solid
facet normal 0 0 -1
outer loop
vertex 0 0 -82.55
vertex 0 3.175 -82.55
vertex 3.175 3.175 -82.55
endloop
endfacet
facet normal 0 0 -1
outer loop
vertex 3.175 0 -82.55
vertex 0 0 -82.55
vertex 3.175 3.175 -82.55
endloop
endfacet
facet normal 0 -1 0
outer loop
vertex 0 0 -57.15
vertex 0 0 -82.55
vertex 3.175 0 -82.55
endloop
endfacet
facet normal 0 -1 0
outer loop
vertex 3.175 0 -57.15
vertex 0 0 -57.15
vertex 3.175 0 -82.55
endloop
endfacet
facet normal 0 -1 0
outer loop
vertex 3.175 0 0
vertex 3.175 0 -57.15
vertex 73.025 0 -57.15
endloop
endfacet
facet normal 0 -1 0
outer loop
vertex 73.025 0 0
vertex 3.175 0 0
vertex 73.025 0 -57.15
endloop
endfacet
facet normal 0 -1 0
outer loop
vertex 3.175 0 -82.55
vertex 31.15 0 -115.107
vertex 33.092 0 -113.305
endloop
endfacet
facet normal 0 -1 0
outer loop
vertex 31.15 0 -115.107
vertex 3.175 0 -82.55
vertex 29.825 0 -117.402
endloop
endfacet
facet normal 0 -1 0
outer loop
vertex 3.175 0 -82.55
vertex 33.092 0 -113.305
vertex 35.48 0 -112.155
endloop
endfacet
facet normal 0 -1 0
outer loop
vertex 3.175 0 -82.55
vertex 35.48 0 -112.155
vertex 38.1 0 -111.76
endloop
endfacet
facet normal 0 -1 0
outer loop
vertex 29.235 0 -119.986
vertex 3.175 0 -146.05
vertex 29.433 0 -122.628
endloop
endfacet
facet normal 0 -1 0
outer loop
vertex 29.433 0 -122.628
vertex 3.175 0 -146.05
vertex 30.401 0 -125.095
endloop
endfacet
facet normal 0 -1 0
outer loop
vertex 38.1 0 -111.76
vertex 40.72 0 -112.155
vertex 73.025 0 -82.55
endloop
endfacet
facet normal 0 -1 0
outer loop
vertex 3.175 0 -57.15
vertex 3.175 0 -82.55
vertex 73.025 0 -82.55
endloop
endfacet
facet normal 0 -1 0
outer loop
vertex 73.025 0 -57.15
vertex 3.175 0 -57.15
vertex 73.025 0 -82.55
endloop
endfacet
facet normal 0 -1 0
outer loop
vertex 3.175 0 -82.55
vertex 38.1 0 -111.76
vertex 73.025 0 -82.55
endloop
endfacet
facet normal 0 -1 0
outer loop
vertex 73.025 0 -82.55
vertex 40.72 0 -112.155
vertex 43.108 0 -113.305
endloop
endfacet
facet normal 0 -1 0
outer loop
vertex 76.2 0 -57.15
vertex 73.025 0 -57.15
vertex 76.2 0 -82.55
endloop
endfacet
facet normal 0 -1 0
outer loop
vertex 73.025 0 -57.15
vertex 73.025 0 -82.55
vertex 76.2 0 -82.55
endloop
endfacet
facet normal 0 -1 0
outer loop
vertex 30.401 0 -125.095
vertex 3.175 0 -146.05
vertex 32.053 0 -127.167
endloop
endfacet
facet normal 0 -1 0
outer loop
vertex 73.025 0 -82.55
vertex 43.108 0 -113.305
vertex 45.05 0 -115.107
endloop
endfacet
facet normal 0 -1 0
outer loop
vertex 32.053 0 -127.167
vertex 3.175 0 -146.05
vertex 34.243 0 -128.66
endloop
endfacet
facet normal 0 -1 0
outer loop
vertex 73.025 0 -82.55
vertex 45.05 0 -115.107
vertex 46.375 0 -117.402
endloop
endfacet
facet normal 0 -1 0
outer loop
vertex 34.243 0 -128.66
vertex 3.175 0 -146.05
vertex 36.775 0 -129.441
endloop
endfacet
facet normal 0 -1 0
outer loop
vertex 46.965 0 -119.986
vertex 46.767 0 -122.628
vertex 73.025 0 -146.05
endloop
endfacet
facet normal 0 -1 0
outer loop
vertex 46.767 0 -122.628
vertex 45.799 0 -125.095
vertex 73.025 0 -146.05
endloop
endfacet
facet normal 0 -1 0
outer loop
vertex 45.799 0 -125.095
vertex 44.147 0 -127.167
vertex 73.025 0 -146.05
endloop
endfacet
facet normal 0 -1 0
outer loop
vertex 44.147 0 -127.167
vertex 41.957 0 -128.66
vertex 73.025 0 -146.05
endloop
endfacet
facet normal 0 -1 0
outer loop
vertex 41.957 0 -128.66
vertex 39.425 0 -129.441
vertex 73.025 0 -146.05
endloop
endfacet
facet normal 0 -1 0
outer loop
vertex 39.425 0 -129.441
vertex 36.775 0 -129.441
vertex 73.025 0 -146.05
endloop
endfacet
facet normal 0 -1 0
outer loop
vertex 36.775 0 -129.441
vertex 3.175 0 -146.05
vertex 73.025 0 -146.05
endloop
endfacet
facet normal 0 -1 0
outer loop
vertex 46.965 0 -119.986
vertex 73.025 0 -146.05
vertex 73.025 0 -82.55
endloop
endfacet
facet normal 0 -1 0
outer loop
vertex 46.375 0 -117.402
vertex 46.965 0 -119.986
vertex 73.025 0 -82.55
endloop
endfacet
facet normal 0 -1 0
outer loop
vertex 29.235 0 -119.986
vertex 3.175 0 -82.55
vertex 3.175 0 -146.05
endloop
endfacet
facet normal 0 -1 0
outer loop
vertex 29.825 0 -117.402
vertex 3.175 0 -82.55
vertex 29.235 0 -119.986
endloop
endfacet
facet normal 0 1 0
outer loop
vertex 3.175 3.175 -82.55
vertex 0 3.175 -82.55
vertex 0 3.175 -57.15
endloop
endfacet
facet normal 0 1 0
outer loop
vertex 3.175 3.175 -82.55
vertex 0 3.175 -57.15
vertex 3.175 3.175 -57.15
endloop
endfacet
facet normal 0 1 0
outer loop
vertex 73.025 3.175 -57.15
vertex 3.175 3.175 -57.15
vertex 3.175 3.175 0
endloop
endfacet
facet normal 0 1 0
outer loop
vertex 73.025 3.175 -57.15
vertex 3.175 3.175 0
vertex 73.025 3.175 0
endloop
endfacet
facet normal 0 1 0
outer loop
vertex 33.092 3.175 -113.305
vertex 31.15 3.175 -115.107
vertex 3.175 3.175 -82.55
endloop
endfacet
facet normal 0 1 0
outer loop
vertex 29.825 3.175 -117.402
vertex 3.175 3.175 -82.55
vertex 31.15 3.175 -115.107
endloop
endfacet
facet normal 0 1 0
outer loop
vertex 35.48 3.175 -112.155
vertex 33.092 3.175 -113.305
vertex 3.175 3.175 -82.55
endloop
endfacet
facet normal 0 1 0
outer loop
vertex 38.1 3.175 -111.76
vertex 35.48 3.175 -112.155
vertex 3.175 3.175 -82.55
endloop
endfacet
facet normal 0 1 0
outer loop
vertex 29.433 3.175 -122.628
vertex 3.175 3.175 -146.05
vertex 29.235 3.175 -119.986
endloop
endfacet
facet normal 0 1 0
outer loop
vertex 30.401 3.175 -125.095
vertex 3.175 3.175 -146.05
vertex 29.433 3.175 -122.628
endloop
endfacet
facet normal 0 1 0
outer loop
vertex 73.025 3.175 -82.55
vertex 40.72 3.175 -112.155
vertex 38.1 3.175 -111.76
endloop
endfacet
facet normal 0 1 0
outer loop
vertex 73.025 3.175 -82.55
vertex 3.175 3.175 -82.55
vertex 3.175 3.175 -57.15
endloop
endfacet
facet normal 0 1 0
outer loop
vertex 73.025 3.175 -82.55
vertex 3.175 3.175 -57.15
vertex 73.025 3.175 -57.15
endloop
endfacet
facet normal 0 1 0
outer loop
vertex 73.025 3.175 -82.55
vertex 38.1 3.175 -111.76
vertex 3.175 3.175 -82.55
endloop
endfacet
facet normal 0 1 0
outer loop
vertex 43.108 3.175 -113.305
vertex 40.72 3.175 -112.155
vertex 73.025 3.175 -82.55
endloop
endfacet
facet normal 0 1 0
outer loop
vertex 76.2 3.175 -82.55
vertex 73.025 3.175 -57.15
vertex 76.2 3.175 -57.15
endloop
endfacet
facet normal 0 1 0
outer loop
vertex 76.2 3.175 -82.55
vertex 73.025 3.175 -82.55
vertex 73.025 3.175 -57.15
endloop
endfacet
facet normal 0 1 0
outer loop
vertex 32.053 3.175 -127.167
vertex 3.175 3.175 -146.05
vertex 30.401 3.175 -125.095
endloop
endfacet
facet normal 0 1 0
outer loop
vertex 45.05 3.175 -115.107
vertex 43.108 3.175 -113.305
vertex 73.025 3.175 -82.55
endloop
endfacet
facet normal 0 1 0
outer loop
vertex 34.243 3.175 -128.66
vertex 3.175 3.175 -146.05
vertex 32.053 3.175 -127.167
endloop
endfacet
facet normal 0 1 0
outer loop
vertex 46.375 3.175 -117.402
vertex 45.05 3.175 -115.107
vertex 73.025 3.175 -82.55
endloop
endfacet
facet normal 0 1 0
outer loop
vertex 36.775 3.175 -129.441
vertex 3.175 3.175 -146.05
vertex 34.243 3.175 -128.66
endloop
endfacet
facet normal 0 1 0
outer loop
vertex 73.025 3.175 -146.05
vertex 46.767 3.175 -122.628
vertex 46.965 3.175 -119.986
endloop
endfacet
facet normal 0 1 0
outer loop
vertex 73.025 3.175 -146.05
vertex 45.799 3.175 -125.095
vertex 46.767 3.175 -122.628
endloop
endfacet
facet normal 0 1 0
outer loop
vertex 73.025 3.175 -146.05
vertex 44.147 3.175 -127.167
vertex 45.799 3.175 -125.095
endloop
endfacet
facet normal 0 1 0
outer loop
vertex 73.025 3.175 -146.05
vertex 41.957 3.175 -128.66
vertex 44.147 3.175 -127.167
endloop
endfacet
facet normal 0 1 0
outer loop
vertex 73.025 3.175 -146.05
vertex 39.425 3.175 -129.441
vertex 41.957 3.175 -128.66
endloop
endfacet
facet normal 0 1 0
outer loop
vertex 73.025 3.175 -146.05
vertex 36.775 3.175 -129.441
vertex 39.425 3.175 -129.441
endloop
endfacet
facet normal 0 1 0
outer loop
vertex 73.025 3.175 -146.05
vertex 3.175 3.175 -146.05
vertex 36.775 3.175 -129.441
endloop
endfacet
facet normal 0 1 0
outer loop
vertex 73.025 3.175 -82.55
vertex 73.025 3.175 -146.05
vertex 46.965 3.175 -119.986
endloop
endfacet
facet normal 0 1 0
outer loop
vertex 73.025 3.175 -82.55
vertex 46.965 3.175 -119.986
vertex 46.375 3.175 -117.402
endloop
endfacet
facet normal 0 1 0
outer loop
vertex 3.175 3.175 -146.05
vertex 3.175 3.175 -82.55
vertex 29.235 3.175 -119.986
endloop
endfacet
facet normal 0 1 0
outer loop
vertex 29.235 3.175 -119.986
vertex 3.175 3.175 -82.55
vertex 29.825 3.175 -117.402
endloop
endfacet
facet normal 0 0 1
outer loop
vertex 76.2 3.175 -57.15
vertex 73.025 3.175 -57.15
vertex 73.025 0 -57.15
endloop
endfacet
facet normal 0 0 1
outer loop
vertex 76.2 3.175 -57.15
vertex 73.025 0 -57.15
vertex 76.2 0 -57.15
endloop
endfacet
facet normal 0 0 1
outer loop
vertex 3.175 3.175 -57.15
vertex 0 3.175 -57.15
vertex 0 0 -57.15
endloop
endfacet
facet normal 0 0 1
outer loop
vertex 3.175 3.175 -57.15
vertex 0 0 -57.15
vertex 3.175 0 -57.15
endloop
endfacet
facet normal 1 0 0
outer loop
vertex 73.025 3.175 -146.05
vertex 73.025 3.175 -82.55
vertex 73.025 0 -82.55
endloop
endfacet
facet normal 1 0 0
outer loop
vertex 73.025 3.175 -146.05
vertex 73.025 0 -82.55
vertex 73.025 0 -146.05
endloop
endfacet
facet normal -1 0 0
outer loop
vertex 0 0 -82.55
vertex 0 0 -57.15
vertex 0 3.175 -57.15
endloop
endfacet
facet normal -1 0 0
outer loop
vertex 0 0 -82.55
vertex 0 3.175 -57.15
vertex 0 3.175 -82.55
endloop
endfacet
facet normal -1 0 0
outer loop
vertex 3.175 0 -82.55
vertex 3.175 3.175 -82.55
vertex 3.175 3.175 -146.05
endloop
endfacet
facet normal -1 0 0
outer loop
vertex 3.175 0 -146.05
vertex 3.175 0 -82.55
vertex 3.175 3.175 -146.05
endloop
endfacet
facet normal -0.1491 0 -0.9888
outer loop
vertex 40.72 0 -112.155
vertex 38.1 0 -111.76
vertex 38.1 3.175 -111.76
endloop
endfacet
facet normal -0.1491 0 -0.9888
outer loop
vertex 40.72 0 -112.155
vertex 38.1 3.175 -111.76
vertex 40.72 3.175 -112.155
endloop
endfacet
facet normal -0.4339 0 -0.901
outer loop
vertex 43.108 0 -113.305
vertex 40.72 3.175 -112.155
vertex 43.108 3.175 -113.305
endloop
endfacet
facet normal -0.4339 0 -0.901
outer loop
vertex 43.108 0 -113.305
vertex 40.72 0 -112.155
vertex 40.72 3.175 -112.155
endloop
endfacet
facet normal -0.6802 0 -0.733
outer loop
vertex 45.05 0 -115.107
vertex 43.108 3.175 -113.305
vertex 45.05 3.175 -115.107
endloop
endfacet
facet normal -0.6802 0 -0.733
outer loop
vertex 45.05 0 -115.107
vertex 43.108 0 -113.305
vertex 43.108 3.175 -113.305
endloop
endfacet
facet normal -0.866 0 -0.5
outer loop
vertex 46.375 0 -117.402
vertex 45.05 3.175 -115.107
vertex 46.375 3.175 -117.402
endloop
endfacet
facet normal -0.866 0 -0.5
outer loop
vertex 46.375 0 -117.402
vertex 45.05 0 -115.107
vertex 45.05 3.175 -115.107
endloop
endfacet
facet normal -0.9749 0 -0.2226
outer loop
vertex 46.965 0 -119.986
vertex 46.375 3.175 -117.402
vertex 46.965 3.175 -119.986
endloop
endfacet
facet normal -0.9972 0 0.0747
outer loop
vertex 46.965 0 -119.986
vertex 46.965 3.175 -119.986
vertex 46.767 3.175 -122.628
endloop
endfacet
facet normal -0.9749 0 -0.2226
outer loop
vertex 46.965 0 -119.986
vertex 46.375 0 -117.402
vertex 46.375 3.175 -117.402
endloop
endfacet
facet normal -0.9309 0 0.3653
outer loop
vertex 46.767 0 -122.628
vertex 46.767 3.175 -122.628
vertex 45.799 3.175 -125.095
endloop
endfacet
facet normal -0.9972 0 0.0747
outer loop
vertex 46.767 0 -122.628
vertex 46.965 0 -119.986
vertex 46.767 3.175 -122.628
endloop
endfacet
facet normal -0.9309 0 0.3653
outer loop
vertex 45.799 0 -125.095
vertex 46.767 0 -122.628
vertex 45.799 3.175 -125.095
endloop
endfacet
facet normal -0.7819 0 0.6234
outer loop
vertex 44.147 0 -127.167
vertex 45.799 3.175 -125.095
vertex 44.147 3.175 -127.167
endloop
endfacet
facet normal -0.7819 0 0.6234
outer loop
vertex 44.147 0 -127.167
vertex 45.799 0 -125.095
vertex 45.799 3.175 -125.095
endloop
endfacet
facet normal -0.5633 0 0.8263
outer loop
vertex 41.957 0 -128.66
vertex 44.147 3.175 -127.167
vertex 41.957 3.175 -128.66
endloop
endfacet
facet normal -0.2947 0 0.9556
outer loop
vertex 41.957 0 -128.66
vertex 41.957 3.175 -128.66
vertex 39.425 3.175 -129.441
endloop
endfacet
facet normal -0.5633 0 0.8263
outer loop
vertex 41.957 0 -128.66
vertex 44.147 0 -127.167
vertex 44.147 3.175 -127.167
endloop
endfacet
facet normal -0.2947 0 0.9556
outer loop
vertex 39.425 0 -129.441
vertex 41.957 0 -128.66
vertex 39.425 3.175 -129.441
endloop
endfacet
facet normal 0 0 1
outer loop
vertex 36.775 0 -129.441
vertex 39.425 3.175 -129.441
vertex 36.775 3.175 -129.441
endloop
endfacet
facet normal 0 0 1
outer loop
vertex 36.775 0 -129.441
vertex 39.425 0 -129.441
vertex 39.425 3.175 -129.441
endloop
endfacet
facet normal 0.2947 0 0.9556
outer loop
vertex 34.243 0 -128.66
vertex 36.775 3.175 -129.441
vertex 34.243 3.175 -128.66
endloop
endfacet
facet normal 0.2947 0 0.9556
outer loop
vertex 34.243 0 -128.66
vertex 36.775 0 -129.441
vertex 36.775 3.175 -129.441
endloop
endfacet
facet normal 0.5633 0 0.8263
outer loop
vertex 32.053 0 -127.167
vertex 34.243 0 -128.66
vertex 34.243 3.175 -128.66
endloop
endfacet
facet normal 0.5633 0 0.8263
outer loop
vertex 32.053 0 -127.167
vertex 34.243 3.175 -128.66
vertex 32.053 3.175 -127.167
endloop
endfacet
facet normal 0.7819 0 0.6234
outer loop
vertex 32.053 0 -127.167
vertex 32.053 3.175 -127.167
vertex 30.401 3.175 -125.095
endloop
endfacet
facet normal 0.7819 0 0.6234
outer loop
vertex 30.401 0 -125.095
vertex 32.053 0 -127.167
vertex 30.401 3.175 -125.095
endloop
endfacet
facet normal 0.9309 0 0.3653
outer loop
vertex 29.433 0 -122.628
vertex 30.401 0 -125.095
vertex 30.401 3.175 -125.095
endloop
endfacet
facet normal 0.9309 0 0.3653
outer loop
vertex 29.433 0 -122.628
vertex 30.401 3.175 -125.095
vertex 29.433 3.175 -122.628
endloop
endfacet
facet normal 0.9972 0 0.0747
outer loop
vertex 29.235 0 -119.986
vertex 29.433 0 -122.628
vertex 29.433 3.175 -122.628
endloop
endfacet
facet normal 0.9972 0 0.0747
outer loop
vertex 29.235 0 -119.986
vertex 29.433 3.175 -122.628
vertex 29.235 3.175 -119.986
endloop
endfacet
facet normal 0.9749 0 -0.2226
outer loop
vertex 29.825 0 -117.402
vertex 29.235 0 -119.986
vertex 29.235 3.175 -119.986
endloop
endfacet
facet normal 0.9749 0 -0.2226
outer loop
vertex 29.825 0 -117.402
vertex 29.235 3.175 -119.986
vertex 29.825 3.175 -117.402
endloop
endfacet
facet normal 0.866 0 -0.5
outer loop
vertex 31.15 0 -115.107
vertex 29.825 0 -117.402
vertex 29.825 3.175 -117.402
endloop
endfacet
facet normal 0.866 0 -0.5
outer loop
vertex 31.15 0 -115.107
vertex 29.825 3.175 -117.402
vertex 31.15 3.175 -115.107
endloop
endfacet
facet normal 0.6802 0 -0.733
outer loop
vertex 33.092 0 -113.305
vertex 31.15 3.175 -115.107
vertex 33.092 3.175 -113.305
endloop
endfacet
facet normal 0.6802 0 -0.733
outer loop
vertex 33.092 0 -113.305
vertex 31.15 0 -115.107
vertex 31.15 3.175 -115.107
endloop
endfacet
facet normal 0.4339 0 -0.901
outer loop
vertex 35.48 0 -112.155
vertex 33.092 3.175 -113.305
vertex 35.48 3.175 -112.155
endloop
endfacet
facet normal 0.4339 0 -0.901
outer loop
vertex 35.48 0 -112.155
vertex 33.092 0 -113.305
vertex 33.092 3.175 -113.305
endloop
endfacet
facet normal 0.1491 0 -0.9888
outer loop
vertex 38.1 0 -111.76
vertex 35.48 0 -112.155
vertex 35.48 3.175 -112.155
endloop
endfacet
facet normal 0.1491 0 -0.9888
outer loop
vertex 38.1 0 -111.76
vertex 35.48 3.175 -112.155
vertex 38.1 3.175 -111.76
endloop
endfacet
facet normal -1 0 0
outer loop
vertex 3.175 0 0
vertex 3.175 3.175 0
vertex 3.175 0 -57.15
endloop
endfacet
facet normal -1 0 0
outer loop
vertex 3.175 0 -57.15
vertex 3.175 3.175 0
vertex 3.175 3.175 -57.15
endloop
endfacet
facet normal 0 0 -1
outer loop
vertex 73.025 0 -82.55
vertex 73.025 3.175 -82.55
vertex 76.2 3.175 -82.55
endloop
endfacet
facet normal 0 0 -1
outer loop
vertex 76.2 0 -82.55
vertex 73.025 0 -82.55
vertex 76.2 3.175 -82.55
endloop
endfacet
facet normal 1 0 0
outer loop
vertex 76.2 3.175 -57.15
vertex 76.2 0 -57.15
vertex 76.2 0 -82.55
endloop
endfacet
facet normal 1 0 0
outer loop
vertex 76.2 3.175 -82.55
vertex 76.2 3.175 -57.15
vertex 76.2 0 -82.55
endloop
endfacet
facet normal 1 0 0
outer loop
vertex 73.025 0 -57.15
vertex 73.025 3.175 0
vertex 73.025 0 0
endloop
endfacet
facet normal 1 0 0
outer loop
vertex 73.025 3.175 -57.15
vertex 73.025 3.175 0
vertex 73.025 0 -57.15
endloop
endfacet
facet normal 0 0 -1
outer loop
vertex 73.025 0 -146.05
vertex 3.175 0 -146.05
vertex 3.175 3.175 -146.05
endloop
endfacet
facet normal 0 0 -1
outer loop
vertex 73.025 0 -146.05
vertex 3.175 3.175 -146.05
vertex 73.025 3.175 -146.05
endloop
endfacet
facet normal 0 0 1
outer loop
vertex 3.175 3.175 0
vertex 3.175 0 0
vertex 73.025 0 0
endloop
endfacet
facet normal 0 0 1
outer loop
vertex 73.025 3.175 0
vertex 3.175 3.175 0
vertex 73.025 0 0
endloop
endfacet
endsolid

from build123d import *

# Parameters (mm, degrees)
SKETCH1_W           = 76.2
SKETCH1_H           = 146.05
SKETCH1_R           = 8.89
BOSS_EXTRUDE1_DEPTH = 3.175
SKETCH2_W           = 3.175
SKETCH2_H           = 57.15
SKETCH2_H_2         = 63.5
CUT_EXTRUDE1_DEPTH  = 3.175


with BuildPart() as part:
    # Sketch1 → Boss-Extrude1 (new body)
    with BuildSketch(Plane(origin=(0, 0, 0), x_dir=(1, 0, 0), z_dir=(0, 1, 0))):
        with Locations((38.1, 73.025)):
            Rectangle(SKETCH1_W, SKETCH1_H)
        with Locations(Location((38.1, 120.65, 0), (0, 0, 270))):
            Circle(SKETCH1_R, mode=Mode.SUBTRACT)
    extrude(amount=BOSS_EXTRUDE1_DEPTH)

    # Sketch2 → Cut-Extrude1 (cut)
    with BuildSketch(Plane(origin=(0, 3.175, 0), x_dir=(1, 0, 0), z_dir=(0, 1, 0))):
        with Locations((1.5875, 28.575)):
            Rectangle(SKETCH2_W, SKETCH2_H)
        with Locations((1.5875, 114.3)):
            Rectangle(SKETCH2_W, SKETCH2_H_2)
        with Locations((74.6125, 114.3)):
            Rectangle(SKETCH2_W, SKETCH2_H_2)
        with Locations((74.6125, 28.575)):
            Rectangle(SKETCH2_W, SKETCH2_H)
    extrude(amount=-CUT_EXTRUDE1_DEPTH, mode=Mode.SUBTRACT)


solid = part.part
